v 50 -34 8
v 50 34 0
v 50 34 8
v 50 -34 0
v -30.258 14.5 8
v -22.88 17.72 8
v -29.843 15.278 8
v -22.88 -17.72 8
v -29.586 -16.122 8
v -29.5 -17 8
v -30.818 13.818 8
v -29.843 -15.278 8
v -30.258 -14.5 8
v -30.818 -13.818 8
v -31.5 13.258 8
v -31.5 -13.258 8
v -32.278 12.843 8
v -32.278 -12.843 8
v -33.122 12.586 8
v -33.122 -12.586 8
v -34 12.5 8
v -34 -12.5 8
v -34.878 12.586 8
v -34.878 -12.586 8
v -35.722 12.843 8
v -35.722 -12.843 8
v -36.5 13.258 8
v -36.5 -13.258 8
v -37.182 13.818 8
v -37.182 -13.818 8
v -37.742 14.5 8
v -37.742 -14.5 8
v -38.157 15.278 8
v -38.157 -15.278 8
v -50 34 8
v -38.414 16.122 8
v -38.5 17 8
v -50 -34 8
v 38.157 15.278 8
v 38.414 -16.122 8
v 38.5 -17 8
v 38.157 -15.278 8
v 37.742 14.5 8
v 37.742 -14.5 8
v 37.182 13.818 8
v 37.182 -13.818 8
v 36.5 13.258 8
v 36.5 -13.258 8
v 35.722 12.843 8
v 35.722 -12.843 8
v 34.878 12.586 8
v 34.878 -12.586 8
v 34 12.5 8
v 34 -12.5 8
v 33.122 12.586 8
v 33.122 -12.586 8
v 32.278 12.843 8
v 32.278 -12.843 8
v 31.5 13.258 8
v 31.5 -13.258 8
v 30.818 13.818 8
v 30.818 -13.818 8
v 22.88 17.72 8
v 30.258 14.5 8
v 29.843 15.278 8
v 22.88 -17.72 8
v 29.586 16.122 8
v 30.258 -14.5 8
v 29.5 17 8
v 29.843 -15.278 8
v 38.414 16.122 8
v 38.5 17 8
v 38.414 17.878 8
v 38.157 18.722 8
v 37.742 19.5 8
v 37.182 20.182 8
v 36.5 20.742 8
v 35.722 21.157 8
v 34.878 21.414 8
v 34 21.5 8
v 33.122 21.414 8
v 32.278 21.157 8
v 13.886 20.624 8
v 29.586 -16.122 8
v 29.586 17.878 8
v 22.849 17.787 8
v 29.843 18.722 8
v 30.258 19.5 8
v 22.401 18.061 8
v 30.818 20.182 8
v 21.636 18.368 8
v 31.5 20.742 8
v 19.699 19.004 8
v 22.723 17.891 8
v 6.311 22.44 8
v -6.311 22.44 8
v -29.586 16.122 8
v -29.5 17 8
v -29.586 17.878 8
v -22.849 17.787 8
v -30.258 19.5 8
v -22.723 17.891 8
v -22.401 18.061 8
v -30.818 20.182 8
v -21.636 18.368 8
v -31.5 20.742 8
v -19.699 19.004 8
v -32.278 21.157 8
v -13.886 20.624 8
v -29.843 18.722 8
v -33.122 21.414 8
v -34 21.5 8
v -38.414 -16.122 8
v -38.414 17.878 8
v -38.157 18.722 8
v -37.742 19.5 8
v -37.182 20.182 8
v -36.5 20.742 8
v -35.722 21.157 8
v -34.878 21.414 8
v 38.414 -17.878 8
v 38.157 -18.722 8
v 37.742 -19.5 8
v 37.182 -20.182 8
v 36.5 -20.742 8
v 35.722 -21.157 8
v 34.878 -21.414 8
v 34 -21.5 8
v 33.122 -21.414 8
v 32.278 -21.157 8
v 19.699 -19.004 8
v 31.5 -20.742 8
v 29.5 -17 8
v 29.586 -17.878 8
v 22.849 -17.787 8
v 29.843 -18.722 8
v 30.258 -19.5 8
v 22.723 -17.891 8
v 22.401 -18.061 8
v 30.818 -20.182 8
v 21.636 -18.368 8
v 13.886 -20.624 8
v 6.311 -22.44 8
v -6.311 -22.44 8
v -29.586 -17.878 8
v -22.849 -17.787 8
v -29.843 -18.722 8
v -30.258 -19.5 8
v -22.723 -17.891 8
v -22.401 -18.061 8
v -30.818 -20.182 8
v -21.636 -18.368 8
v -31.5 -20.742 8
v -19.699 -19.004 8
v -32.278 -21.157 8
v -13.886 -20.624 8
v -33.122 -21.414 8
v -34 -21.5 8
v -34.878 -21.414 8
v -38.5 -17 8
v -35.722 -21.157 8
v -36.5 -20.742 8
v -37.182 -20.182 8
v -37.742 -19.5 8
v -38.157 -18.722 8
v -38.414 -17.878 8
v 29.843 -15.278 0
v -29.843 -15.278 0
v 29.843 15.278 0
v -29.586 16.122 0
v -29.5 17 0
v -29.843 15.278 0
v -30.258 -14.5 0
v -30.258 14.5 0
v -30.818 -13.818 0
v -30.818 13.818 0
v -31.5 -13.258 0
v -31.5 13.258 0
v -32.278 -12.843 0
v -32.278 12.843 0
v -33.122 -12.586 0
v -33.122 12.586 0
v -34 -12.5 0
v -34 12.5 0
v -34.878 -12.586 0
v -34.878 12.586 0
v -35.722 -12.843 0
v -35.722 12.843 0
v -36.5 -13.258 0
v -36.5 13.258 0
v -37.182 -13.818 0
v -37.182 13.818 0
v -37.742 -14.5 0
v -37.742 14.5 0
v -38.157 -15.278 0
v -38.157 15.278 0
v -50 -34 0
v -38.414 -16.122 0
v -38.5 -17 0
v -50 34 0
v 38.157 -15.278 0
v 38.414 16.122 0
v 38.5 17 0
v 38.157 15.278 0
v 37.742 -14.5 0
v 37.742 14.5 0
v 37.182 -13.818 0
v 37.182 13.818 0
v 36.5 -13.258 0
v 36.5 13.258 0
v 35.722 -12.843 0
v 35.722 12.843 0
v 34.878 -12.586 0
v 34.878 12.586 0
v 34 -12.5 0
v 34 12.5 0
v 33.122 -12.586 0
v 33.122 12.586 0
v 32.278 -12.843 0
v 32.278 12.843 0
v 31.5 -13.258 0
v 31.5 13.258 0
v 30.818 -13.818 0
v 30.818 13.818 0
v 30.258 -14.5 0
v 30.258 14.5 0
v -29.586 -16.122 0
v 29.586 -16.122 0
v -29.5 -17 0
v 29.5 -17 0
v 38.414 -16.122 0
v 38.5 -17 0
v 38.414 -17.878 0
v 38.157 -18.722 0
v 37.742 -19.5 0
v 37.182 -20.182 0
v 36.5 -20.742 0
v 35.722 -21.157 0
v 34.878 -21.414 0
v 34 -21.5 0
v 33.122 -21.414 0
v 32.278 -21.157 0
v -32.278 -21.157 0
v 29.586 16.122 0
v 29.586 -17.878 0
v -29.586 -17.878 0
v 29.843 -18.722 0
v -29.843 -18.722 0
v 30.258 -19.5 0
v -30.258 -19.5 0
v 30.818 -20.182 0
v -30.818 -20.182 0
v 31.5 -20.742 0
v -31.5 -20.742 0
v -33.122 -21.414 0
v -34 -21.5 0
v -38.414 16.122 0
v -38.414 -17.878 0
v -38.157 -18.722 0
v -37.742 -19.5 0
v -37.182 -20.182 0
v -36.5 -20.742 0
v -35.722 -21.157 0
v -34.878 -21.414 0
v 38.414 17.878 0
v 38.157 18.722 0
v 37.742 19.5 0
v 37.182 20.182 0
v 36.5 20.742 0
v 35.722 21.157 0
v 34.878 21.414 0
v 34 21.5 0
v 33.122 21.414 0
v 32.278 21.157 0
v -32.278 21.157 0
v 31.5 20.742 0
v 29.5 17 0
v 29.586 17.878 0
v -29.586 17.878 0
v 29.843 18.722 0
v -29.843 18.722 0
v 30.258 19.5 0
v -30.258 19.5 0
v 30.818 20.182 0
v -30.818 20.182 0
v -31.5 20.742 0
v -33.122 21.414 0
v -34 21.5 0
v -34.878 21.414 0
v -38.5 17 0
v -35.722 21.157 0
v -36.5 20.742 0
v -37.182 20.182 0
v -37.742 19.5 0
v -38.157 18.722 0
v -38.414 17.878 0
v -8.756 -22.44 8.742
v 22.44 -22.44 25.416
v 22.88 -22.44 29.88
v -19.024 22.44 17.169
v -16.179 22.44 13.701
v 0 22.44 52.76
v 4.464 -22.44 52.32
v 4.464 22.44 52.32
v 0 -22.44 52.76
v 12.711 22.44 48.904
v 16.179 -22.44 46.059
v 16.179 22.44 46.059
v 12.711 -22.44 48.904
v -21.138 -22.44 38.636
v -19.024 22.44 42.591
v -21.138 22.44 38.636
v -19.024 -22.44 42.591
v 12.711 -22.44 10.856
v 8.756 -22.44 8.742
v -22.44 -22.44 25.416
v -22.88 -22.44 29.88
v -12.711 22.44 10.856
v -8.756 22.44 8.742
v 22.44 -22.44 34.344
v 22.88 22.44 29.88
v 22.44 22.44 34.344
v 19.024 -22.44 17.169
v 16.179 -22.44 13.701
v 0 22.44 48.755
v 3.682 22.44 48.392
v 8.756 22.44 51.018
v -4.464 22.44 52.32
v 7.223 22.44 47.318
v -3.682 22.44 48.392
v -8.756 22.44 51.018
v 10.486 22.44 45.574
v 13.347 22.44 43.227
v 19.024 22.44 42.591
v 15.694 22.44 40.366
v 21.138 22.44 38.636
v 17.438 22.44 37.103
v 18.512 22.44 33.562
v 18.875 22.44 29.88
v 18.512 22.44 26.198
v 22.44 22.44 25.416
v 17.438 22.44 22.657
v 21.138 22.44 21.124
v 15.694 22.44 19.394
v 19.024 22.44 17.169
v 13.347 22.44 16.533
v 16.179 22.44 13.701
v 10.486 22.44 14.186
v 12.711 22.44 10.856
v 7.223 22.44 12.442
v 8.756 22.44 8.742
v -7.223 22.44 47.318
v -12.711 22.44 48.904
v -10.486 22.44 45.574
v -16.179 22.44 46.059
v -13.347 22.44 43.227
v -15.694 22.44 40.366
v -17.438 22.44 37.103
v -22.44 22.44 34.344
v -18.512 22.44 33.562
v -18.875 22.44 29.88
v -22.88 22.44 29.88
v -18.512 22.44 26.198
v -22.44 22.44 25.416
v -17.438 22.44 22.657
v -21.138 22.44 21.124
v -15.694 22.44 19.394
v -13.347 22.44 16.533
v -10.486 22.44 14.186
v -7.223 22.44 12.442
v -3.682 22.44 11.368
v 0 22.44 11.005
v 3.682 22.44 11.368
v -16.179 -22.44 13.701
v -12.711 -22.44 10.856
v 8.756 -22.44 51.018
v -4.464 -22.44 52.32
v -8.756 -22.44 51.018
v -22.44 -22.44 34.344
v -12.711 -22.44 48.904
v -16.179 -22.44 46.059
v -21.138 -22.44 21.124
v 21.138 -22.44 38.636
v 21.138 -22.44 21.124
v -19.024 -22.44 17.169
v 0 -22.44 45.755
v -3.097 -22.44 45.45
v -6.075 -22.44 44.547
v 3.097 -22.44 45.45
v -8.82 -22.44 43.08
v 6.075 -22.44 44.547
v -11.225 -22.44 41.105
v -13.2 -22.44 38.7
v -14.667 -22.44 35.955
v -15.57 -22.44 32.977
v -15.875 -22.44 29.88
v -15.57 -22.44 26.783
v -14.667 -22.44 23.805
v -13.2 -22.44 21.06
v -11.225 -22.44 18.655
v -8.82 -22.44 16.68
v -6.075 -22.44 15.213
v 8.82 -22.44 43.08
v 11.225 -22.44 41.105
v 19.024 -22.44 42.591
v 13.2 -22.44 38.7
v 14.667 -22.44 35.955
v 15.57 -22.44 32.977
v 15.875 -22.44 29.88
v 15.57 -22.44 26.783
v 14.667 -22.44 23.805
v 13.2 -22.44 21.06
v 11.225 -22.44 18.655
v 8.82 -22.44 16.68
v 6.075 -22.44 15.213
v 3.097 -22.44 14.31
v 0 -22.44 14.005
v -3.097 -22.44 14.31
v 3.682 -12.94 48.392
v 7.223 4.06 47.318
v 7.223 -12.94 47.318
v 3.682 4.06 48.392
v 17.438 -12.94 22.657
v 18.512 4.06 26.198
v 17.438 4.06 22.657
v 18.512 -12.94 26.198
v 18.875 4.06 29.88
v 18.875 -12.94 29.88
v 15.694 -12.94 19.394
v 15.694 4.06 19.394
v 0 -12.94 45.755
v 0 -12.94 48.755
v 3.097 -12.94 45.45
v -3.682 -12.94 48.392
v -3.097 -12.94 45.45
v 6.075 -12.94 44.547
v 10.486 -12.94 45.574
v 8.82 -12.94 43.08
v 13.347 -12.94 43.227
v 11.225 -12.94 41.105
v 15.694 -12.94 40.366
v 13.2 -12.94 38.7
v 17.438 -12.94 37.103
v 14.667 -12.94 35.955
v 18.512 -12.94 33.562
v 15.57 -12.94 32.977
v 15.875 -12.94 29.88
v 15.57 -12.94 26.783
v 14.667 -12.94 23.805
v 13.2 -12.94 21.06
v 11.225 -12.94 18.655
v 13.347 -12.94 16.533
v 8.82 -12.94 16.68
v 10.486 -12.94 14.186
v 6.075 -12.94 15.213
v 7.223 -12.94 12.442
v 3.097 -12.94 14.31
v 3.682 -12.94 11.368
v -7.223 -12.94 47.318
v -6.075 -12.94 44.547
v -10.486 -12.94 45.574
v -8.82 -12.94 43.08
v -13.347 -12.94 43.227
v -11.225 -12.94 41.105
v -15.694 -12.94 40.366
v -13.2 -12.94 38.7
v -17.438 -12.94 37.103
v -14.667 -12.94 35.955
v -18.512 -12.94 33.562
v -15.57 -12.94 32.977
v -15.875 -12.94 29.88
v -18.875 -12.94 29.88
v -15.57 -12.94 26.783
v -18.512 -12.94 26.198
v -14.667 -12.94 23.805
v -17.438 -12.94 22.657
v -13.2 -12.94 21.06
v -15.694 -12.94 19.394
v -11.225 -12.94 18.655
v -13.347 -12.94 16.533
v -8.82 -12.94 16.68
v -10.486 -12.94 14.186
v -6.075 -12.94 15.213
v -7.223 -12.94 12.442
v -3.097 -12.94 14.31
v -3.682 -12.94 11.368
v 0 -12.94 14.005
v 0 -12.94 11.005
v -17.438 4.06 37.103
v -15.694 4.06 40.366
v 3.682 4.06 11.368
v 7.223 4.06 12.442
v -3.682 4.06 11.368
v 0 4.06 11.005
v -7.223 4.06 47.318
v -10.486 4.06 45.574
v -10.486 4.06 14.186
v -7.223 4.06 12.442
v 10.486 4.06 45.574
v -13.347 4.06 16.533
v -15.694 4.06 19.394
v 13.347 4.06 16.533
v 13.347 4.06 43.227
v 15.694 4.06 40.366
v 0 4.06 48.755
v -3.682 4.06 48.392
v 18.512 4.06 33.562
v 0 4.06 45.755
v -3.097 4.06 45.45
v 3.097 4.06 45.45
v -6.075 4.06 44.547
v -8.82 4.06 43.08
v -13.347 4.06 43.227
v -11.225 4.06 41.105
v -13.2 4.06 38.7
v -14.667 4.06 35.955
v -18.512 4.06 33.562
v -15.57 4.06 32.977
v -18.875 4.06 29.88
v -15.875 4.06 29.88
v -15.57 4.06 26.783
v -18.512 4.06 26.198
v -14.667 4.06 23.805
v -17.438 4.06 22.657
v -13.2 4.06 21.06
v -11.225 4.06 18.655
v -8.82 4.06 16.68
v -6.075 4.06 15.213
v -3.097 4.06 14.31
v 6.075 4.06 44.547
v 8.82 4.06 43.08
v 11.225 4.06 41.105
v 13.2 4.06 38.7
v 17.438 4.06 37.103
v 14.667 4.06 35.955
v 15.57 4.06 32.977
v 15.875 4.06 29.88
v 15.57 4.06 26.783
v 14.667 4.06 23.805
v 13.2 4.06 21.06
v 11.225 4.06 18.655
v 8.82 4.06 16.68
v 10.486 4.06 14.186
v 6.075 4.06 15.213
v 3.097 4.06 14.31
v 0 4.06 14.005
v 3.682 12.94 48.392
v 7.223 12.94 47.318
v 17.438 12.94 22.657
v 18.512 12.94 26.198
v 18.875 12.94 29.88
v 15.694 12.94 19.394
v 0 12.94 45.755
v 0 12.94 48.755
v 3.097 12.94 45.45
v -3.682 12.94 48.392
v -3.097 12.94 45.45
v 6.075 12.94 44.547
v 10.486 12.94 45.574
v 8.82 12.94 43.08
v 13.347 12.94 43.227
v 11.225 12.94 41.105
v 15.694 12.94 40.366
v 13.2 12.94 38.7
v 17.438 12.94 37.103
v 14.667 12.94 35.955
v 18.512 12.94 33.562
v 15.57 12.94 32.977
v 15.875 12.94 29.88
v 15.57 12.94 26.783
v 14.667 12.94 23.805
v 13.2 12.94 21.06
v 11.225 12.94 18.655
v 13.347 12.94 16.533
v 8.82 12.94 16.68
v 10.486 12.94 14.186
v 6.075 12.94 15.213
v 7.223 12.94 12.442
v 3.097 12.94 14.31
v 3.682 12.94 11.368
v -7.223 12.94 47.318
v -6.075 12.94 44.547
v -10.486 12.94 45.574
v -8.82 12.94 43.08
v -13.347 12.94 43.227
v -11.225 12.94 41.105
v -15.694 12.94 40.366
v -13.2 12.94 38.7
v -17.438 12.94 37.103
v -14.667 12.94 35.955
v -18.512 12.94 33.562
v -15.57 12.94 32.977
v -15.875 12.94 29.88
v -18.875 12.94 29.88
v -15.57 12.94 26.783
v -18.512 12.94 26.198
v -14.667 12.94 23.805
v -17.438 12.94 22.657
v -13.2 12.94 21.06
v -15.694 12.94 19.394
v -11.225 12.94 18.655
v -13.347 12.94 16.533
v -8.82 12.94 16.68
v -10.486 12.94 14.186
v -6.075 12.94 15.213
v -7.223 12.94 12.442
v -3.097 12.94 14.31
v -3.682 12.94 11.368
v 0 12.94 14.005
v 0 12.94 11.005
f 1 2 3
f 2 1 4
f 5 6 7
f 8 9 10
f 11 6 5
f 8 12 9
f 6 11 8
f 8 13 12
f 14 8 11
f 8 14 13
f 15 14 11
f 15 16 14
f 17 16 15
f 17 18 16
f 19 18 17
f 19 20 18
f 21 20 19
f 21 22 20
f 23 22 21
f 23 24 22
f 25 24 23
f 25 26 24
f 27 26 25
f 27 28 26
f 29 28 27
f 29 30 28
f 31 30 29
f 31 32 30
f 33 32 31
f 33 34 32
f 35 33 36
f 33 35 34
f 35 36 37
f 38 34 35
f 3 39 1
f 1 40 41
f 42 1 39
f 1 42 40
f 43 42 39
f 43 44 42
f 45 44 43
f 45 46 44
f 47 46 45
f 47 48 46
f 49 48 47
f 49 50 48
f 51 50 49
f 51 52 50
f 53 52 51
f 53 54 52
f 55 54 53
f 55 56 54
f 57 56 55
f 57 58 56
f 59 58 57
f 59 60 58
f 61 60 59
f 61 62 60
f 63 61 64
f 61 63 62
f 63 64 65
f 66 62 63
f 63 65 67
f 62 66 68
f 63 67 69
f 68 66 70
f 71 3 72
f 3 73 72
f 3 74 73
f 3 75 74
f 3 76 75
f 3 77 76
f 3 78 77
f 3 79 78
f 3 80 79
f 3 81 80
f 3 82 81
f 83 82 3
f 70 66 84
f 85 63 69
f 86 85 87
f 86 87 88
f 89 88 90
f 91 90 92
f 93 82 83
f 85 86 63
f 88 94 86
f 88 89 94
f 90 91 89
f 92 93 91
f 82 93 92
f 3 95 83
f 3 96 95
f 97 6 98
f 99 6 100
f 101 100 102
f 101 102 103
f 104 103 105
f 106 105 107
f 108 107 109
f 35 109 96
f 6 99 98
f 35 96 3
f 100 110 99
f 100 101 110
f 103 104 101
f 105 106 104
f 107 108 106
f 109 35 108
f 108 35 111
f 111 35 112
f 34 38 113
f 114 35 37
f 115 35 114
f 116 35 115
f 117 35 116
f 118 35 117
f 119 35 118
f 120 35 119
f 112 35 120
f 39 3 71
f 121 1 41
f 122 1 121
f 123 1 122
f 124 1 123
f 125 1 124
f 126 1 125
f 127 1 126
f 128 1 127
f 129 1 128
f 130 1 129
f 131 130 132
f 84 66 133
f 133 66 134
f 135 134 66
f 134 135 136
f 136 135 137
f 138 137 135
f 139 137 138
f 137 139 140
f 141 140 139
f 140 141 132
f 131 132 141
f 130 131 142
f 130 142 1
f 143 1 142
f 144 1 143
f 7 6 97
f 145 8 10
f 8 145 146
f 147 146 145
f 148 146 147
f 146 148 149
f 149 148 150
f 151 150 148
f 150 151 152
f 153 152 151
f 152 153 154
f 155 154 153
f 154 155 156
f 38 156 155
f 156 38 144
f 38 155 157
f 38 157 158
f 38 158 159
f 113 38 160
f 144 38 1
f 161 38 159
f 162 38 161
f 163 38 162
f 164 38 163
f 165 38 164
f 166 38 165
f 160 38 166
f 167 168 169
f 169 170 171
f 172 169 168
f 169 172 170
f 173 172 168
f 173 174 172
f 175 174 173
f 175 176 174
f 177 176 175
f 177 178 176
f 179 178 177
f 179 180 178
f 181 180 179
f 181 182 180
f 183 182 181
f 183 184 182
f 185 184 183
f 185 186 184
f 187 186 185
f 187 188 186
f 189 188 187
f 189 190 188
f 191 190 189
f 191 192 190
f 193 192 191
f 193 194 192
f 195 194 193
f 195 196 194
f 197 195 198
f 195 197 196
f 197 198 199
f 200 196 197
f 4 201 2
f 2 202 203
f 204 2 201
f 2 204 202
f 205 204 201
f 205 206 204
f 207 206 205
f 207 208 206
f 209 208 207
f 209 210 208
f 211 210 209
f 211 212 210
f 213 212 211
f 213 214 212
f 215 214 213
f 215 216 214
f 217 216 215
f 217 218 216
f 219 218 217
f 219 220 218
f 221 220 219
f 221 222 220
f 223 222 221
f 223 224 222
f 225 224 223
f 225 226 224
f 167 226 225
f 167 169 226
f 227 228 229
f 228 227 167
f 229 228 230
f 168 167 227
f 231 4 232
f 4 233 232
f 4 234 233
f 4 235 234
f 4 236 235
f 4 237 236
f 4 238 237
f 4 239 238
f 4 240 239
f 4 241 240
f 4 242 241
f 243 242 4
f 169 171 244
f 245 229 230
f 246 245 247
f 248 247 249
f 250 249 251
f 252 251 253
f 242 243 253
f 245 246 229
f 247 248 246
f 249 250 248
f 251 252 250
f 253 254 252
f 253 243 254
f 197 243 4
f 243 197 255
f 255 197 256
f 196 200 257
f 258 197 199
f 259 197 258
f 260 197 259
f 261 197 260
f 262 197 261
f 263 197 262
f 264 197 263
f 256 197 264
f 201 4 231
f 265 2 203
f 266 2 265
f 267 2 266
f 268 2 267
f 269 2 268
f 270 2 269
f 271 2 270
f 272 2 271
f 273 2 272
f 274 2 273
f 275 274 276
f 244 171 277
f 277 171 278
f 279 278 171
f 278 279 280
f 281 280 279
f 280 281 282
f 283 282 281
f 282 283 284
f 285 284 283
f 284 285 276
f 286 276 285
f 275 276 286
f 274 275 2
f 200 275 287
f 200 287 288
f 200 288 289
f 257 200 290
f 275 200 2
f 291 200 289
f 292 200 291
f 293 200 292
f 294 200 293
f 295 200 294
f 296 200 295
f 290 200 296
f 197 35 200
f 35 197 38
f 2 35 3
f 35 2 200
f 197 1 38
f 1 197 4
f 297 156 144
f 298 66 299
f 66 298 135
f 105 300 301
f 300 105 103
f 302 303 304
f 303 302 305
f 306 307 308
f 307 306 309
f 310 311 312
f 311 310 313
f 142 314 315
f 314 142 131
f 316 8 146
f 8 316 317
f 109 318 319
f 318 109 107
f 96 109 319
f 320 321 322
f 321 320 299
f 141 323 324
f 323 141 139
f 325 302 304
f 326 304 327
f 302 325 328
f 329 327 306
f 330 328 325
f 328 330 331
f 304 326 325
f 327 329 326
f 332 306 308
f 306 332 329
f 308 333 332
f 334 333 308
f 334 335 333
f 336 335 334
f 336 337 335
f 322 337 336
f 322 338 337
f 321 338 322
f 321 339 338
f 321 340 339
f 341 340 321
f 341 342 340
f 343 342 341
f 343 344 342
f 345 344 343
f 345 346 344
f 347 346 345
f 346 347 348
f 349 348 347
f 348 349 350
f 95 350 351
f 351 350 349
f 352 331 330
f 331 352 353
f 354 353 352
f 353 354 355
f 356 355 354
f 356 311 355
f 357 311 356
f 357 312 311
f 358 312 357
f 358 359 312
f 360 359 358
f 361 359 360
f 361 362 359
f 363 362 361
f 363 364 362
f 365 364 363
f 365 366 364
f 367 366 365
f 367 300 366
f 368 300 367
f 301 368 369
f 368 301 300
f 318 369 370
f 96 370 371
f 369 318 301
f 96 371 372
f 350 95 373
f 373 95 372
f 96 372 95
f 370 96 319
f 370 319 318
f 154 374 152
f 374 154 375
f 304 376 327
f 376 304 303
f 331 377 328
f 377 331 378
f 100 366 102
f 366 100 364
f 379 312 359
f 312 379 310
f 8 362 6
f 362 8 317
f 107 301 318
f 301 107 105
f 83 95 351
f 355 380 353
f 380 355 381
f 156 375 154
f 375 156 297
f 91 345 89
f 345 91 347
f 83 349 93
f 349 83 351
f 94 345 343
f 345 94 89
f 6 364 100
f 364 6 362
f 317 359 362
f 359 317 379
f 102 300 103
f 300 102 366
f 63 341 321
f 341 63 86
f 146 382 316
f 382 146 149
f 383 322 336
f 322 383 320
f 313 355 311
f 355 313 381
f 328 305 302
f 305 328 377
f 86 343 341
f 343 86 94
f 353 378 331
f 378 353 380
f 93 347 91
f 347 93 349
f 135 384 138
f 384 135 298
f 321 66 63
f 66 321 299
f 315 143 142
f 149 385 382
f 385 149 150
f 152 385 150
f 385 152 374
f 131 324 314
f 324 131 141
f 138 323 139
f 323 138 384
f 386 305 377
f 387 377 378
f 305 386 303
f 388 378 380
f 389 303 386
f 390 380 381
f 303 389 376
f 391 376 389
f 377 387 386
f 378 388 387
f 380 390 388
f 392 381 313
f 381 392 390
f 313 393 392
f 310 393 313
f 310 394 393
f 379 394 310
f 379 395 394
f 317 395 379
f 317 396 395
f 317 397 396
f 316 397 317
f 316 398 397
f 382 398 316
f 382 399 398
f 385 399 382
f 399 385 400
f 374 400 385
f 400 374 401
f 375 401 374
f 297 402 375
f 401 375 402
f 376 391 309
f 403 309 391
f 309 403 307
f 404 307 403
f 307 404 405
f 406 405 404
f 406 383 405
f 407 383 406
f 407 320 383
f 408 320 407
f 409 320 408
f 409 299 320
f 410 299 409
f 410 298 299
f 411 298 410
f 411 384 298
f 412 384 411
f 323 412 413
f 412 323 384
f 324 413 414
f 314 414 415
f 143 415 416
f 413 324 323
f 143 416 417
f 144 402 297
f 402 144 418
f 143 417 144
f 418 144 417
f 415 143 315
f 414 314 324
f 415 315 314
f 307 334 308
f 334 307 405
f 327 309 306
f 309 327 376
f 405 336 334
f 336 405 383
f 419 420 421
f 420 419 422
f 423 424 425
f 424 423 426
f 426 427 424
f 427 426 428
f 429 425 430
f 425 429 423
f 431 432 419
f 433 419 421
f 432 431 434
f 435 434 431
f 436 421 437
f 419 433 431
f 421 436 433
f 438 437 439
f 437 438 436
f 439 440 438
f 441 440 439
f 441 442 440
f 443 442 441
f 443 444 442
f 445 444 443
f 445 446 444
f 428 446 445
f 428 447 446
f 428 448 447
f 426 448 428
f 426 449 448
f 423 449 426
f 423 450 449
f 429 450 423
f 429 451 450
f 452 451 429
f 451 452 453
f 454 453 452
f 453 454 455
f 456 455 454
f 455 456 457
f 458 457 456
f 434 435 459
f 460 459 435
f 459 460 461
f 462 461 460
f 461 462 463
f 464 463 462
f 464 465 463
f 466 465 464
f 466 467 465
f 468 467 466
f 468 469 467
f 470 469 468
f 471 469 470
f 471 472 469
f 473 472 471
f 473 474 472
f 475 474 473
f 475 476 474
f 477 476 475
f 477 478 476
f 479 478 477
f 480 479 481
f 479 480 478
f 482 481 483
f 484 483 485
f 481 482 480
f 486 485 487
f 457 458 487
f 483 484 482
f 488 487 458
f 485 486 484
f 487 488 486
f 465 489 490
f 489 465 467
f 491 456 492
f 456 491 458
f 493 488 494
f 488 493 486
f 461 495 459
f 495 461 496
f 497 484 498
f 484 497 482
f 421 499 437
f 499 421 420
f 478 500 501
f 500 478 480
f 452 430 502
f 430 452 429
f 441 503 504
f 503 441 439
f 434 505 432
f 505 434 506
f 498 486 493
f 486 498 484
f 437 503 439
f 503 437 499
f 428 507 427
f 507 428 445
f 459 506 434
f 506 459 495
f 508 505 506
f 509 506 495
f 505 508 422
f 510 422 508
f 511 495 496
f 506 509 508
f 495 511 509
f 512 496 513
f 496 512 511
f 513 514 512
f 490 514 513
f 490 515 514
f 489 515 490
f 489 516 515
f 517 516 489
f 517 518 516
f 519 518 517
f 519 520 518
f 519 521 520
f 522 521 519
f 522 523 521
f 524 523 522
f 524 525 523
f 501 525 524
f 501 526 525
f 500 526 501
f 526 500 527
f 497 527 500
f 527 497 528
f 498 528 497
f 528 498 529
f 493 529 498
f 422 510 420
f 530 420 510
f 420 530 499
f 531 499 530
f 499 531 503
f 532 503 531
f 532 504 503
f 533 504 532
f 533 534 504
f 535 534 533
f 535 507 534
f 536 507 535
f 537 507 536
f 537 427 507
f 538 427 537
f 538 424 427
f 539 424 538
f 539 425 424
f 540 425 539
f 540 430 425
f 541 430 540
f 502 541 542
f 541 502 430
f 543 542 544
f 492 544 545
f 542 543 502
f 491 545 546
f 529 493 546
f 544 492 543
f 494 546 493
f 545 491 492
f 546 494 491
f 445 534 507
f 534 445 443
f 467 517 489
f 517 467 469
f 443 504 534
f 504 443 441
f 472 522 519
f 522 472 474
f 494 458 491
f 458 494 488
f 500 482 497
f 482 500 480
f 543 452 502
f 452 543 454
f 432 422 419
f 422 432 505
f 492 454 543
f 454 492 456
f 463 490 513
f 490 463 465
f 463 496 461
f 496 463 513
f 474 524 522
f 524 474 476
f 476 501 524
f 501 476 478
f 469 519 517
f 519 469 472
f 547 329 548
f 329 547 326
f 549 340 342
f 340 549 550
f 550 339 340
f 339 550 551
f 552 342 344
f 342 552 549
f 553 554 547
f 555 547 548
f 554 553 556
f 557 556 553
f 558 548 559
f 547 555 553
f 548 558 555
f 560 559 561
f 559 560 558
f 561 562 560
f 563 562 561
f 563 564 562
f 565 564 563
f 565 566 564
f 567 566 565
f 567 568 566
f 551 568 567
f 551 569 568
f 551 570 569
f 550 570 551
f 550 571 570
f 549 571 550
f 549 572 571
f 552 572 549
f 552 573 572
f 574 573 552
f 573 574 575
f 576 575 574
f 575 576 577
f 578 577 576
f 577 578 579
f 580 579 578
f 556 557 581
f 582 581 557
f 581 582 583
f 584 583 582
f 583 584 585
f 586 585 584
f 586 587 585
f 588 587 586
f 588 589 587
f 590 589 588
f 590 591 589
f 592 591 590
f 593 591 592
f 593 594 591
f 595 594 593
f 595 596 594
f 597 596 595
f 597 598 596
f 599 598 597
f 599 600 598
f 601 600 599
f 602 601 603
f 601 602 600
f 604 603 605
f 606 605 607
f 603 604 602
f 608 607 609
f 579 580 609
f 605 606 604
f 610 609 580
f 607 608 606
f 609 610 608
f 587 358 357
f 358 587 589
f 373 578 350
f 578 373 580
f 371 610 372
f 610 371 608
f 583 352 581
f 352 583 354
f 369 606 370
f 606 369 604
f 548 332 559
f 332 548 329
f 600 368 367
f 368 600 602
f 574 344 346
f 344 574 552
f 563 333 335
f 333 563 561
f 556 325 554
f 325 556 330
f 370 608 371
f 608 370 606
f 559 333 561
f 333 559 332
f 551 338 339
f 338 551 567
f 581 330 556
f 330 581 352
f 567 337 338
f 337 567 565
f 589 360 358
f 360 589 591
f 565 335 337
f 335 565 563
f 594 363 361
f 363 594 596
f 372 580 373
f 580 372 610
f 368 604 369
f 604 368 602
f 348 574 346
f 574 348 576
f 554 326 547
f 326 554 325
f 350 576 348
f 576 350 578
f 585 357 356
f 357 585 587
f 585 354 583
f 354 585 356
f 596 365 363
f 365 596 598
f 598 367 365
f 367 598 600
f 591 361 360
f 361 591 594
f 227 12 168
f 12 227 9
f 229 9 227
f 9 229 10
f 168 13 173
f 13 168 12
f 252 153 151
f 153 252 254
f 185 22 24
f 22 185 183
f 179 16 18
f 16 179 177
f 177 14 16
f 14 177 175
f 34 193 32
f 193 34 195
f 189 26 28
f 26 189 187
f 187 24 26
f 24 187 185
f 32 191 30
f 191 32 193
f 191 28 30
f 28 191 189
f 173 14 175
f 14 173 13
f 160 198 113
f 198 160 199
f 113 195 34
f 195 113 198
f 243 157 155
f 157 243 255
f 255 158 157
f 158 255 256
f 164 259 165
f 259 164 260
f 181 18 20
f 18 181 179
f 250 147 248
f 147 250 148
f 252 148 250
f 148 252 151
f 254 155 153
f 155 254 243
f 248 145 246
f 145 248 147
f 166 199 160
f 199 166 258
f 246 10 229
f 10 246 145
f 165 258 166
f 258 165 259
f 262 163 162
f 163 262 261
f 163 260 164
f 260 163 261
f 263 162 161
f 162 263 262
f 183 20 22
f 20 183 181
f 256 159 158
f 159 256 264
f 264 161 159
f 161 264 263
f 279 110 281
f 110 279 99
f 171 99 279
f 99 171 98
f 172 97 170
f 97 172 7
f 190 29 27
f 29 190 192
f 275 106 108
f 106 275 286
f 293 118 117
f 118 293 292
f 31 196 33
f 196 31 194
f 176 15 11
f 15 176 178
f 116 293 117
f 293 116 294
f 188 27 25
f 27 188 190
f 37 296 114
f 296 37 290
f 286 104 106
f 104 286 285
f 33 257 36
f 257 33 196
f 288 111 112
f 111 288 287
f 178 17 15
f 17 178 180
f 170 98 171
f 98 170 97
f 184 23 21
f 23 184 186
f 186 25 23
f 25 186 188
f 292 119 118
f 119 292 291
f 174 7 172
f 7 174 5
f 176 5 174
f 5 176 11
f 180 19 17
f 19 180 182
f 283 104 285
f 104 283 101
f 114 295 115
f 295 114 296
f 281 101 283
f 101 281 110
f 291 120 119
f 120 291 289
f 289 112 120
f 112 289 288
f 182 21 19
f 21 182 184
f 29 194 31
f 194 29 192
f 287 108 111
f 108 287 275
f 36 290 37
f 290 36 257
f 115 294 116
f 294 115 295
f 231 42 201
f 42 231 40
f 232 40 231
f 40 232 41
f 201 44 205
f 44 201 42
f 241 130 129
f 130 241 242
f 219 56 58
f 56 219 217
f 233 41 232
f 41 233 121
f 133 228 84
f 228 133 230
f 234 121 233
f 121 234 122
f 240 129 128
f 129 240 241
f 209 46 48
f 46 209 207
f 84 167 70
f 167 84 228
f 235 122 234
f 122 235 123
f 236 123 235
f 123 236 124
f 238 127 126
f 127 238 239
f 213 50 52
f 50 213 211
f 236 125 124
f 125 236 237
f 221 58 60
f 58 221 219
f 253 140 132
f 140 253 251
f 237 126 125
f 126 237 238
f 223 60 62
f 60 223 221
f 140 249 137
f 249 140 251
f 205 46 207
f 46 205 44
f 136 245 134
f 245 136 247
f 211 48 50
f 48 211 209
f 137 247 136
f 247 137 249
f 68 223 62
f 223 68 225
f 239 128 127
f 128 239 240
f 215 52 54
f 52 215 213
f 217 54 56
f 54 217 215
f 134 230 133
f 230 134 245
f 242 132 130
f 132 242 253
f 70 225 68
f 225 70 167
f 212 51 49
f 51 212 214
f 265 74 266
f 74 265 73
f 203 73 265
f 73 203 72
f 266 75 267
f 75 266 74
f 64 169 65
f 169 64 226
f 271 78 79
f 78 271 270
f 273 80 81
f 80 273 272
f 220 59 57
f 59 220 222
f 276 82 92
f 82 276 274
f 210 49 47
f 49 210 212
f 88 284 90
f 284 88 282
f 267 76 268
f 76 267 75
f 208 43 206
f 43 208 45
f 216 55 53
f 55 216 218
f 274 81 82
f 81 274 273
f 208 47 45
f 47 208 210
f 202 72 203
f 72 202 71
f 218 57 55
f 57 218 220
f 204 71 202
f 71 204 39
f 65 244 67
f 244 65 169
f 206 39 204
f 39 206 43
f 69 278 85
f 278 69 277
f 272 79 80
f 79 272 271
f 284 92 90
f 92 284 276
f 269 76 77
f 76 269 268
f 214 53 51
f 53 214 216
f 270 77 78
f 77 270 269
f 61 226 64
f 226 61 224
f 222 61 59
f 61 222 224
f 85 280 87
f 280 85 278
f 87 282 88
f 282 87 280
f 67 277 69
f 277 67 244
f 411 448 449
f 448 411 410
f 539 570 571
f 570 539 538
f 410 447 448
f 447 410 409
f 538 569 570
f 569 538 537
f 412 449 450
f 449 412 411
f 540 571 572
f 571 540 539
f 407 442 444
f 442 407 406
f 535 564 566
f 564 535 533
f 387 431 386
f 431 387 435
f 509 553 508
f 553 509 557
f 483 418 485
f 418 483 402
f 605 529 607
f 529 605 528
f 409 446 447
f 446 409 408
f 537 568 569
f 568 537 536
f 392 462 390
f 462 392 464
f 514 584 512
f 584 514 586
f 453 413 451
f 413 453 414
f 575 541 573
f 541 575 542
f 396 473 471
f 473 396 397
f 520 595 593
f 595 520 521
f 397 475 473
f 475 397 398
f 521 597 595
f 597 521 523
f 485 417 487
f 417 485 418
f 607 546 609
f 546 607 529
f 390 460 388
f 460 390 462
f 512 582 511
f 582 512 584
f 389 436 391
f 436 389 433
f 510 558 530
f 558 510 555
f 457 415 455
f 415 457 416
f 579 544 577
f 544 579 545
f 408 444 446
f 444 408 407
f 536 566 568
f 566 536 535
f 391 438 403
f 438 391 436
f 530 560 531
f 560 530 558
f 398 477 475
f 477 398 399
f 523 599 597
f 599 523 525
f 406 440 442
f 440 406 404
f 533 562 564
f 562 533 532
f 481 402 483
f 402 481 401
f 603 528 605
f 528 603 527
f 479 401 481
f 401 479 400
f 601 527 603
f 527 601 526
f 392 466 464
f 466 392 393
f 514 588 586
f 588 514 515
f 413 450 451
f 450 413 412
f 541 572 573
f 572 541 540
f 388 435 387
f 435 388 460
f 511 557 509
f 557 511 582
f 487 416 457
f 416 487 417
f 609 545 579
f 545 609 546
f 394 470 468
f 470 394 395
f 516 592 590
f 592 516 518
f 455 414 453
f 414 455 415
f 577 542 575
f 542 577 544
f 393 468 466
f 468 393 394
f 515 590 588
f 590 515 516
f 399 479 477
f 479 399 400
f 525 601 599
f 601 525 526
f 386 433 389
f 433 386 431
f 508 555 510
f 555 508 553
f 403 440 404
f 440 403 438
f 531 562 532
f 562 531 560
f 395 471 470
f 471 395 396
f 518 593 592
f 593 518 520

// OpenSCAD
$fn = 32;

// ----------------------------------------------------------------------
// Bearing block: 100 x 68 mm base, 31.75 mm bore at 29.88 mm
// ----------------------------------------------------------------------

// --- parameters (mm) ---
base_w = 100;             // base width
base_d = 68;              // base depth
base_t = 8;               // base thickness
bore_d = 31.75;           // shaft / bearing bore
house_r = 22.88;          // housing outer radius
house_len = 44.88;        // housing length along the shaft
foot_w = 45.76;           // foot width under the housing
foot_len = 34.88;         // foot length along the shaft
axis_z = 29.88;           // bore axis height above the base
holes_d = 9;              // mounting holes
hole_x = 34;              // mounting hole spacing
seat_d = 12;              // bearing seat depth
seat_wall = 3;            // seat wall thickness

difference() {
  union() {
    /* base plate with its underside on z = 0 */
    translate([0, 0, base_t / 2]) cube([base_w, base_d, base_t], center = true);
    /* hull foot: a straight web blending into the round housing */
    hull() {
      translate([0, 0, base_t - 0.5]) cube([foot_w, foot_len, 1.6], center = true);
      translate([0, 0, axis_z]) rotate([-90, 0, 0]) cylinder(h = house_len, d = 2 * house_r, center = true);
    }
  }
  /* bore through the housing, 2.5 mm clear on both sides */
  translate([0, 0, axis_z]) rotate([-90, 0, 0]) cylinder(h = house_len + 5, d = bore_d, center = true);
  /* bearing seats, recessed into both ends of the housing */
  for (sy = [-1, 1]) {
    translate([0, sy * (house_len / 2 - seat_d + 2.5), axis_z]) rotate([-90, 0, 0]) cylinder(h = seat_d + 5, d = bore_d + 2 * seat_wall);
  }
  /* mounting holes through the base plate */
  for (hx = [-34, 34]) {
    for (hy = [-17, 17]) {
      translate([hx, hy, -2.5]) cylinder(h = base_t + 5, d = holes_d);
    }
  }
}
